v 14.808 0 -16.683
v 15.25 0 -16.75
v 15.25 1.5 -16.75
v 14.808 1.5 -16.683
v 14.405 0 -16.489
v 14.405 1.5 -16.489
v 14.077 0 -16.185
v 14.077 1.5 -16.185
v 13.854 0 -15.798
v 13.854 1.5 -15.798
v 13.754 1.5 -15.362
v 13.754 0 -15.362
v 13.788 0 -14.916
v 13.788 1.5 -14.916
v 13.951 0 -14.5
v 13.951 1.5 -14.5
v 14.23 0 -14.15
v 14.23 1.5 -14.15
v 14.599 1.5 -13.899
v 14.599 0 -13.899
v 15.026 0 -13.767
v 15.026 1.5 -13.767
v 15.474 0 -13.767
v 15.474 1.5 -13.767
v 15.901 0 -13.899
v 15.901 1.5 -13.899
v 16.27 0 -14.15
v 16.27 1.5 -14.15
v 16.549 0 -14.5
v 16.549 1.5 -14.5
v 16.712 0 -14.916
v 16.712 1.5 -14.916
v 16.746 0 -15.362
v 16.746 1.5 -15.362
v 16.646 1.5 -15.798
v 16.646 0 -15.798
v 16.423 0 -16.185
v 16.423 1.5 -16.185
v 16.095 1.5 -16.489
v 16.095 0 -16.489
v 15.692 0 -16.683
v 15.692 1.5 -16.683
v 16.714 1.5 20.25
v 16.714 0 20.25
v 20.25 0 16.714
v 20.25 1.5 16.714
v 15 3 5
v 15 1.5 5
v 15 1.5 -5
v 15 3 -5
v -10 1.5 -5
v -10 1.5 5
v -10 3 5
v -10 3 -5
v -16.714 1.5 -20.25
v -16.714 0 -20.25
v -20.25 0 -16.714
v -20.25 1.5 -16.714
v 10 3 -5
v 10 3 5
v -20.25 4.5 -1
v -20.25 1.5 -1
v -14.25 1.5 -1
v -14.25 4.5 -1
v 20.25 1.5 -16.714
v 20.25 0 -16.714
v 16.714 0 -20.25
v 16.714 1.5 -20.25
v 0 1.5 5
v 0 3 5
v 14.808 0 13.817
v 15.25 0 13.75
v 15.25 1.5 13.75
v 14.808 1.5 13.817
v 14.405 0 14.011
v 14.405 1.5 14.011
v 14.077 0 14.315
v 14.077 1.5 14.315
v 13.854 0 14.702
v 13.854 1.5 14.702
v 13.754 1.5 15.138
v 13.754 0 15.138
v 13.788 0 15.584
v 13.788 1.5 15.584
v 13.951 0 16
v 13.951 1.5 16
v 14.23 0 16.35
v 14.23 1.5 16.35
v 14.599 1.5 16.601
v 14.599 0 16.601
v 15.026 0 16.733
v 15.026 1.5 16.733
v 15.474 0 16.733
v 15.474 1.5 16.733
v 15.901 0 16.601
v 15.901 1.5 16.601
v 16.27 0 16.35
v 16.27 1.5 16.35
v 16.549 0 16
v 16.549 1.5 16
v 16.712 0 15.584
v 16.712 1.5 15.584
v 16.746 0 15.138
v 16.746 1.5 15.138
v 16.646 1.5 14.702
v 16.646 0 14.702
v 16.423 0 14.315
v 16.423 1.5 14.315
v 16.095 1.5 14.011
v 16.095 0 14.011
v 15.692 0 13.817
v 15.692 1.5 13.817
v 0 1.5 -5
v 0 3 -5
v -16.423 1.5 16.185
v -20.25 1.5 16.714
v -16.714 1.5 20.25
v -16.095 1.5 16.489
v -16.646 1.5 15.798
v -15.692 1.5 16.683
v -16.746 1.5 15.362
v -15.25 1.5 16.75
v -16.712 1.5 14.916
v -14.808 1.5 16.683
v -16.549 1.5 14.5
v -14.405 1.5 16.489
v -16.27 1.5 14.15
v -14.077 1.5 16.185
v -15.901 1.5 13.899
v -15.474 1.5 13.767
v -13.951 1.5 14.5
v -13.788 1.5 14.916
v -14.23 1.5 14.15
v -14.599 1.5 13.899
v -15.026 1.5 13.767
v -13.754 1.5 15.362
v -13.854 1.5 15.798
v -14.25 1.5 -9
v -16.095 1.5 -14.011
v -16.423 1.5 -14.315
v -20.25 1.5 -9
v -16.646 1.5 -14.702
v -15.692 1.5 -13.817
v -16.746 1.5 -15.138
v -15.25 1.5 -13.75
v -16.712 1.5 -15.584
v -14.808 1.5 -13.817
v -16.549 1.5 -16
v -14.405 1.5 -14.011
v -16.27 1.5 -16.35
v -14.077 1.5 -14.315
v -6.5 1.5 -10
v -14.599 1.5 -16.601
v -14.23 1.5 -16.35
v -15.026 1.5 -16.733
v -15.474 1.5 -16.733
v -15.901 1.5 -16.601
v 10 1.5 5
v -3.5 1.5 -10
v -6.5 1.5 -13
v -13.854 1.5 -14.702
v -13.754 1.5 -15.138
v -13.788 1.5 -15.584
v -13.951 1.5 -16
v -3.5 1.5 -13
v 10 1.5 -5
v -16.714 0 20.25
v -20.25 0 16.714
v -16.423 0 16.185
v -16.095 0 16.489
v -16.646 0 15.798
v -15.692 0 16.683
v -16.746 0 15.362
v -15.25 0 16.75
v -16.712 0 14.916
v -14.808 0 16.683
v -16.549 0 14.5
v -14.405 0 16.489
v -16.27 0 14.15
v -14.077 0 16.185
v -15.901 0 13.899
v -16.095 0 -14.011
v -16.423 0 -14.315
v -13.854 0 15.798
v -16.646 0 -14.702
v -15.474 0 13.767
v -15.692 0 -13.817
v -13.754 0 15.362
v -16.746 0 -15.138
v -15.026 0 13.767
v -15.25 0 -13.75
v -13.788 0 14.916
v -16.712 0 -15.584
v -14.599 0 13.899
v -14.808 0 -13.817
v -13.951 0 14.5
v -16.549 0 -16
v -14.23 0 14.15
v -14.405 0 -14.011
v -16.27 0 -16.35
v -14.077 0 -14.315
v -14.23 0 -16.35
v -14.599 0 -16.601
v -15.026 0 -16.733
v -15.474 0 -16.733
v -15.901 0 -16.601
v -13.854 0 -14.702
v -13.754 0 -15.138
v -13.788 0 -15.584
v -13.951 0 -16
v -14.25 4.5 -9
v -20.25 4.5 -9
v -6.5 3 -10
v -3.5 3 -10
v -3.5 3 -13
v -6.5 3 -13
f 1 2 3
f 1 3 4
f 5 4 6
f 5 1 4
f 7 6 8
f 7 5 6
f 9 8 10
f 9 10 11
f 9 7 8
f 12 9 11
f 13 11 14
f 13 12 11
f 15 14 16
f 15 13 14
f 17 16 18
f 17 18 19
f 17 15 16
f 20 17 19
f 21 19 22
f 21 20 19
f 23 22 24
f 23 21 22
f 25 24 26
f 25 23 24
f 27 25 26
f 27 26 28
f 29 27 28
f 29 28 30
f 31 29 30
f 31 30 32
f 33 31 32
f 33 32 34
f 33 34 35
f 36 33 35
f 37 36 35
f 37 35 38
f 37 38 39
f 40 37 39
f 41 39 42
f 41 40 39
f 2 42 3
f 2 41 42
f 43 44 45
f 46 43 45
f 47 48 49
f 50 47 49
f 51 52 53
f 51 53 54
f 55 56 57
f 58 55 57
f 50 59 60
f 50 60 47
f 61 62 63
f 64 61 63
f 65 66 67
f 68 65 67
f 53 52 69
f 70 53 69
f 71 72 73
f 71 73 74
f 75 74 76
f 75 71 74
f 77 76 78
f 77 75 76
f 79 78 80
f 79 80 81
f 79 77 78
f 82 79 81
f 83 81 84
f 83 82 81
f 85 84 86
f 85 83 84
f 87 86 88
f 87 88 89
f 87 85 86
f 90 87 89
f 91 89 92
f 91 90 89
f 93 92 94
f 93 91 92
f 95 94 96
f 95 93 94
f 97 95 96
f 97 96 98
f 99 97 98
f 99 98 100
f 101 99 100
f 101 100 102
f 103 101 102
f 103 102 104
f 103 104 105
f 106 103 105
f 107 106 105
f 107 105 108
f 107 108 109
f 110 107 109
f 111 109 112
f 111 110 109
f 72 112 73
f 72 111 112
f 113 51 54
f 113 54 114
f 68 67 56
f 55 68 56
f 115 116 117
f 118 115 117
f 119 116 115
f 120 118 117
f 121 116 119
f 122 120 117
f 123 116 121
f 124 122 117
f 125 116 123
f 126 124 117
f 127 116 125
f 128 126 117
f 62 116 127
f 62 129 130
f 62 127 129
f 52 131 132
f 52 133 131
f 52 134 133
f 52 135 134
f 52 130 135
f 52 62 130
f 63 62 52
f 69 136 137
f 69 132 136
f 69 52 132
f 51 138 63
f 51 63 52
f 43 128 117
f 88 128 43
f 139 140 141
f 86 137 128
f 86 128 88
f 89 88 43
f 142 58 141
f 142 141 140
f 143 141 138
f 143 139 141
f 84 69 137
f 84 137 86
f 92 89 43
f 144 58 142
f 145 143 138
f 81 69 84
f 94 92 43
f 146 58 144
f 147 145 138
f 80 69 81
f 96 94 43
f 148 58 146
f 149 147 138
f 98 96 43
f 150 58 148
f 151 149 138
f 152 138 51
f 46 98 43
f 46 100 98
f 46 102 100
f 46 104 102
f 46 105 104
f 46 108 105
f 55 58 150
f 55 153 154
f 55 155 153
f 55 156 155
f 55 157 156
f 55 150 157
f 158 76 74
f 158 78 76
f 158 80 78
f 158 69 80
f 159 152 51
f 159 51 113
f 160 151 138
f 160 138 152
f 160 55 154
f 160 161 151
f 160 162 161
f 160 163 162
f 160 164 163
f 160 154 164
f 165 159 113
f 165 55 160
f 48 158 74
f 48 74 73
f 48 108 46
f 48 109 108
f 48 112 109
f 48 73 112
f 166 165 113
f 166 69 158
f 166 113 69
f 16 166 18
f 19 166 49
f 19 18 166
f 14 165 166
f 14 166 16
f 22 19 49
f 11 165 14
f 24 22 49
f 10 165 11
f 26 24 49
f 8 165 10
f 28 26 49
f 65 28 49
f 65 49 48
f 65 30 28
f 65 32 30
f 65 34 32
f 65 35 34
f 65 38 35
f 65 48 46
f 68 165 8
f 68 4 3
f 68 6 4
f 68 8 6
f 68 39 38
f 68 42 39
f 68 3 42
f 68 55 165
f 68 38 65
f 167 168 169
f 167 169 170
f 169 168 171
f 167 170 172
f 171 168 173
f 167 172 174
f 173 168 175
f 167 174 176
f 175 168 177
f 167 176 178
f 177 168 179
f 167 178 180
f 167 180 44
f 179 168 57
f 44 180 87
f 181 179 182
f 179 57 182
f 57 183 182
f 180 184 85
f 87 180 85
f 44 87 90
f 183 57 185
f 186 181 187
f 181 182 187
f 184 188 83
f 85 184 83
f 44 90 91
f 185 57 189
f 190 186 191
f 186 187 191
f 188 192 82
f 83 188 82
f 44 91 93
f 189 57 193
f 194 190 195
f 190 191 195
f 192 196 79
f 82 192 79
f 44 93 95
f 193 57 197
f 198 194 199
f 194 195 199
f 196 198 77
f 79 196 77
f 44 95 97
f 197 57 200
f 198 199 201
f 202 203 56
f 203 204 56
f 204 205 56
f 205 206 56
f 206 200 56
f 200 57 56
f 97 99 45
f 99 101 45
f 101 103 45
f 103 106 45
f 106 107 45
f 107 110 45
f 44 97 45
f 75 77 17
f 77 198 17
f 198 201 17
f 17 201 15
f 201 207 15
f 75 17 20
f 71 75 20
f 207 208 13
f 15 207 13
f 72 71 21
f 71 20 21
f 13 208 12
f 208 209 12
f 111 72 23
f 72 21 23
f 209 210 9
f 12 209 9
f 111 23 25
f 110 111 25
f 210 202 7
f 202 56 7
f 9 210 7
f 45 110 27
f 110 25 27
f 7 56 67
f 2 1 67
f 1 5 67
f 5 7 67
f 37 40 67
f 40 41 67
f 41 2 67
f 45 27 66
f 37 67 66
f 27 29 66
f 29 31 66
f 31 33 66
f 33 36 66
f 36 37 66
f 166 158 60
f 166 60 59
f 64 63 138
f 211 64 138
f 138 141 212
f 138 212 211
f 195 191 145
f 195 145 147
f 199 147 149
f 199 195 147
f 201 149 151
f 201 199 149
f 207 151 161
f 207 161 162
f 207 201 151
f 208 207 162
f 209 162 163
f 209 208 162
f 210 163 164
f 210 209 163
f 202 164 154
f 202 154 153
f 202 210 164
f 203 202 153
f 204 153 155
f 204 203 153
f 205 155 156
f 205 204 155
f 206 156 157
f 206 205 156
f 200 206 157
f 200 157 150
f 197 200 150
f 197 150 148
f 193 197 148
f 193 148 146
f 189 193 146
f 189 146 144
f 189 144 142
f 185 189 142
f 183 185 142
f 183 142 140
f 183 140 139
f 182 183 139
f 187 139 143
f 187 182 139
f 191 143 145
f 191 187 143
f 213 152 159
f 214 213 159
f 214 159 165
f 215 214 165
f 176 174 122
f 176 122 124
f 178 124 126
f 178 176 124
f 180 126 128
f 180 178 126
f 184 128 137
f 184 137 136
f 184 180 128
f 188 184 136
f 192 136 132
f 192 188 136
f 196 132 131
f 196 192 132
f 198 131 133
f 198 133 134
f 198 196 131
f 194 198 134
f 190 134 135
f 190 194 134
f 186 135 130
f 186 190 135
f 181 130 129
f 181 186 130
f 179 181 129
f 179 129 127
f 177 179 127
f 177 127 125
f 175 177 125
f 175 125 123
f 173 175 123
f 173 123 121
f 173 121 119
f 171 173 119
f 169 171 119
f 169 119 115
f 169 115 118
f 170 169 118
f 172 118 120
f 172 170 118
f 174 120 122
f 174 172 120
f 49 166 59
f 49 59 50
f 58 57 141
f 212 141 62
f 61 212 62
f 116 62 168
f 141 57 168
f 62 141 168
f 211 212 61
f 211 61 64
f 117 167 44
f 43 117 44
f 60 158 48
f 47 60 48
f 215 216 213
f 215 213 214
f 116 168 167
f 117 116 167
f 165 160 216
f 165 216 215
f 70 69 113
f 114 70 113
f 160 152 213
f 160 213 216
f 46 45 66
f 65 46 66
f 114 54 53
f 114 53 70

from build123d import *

# Parameters (mm, degrees)
SKETCH1_R           = 1.5
BOSS_EXTRUDE1_DEPTH = 1.5
SKETCH2_W           = 10
SKETCH2_H           = 10
SKETCH2_W_2         = 5
SKETCH2_W_3         = 3
SKETCH2_H_2         = 3
BOSS_EXTRUDE2_DEPTH = 1.5
SKETCH3_W           = 6
SKETCH3_H           = 8
BOSS_EXTRUDE3_DEPTH = 3


with BuildPart() as part:
    # Sketch1 → Boss-Extrude1 (new body)
    with BuildSketch(Plane(origin=(0, 0, 0), x_dir=(1, 0, 0), z_dir=(0, 1, 0))):
        Polygon((16.714466094, 20.25), (-16.714466094, 20.25), (-20.25, 16.714466094), (-20.25, -16.714466094), (-16.714466094, -20.25), (16.714466094, -20.25), (20.25, -16.714466094), (20.25, 16.714466094), align=None)
        with Locations(Location((-15.25, 15.25, 0), (0, 0, 270))):
            Circle(SKETCH1_R, mode=Mode.SUBTRACT)
        with Locations(Location((-15.25, -15.25, 0), (0, 0, 270))):
            Circle(SKETCH1_R, mode=Mode.SUBTRACT)
        with Locations(Location((15.25, -15.25, 0), (0, 0, 90))):
            Circle(SKETCH1_R, mode=Mode.SUBTRACT)
        with Locations(Location((15.25, 15.25, 0), (0, 0, 90))):
            Circle(SKETCH1_R, mode=Mode.SUBTRACT)
    extrude(amount=BOSS_EXTRUDE1_DEPTH)

    # Sketch2 → Boss-Extrude2 (add)
    with BuildSketch(Plane(origin=(0, 1.5, 0), x_dir=(1, 0, 0), z_dir=(0, 1, 0))):
        with Locations((-5, 0)):
            Rectangle(SKETCH2_W, SKETCH2_H)
        with Locations((12.5, 0)):
            Rectangle(SKETCH2_W_2, SKETCH2_H)
        with Locations((-5, 11.5)):
            Rectangle(SKETCH2_W_3, SKETCH2_H_2)
    extrude(amount=BOSS_EXTRUDE2_DEPTH)

    # Sketch3 → Boss-Extrude3 (add)
    with BuildSketch(Plane(origin=(0, 1.5, 0), x_dir=(1, 0, 0), z_dir=(0, 1, 0))):
        with Locations((-17.25, 5)):
            Rectangle(SKETCH3_W, SKETCH3_H)
    extrude(amount=BOSS_EXTRUDE3_DEPTH)


solid = part.part
